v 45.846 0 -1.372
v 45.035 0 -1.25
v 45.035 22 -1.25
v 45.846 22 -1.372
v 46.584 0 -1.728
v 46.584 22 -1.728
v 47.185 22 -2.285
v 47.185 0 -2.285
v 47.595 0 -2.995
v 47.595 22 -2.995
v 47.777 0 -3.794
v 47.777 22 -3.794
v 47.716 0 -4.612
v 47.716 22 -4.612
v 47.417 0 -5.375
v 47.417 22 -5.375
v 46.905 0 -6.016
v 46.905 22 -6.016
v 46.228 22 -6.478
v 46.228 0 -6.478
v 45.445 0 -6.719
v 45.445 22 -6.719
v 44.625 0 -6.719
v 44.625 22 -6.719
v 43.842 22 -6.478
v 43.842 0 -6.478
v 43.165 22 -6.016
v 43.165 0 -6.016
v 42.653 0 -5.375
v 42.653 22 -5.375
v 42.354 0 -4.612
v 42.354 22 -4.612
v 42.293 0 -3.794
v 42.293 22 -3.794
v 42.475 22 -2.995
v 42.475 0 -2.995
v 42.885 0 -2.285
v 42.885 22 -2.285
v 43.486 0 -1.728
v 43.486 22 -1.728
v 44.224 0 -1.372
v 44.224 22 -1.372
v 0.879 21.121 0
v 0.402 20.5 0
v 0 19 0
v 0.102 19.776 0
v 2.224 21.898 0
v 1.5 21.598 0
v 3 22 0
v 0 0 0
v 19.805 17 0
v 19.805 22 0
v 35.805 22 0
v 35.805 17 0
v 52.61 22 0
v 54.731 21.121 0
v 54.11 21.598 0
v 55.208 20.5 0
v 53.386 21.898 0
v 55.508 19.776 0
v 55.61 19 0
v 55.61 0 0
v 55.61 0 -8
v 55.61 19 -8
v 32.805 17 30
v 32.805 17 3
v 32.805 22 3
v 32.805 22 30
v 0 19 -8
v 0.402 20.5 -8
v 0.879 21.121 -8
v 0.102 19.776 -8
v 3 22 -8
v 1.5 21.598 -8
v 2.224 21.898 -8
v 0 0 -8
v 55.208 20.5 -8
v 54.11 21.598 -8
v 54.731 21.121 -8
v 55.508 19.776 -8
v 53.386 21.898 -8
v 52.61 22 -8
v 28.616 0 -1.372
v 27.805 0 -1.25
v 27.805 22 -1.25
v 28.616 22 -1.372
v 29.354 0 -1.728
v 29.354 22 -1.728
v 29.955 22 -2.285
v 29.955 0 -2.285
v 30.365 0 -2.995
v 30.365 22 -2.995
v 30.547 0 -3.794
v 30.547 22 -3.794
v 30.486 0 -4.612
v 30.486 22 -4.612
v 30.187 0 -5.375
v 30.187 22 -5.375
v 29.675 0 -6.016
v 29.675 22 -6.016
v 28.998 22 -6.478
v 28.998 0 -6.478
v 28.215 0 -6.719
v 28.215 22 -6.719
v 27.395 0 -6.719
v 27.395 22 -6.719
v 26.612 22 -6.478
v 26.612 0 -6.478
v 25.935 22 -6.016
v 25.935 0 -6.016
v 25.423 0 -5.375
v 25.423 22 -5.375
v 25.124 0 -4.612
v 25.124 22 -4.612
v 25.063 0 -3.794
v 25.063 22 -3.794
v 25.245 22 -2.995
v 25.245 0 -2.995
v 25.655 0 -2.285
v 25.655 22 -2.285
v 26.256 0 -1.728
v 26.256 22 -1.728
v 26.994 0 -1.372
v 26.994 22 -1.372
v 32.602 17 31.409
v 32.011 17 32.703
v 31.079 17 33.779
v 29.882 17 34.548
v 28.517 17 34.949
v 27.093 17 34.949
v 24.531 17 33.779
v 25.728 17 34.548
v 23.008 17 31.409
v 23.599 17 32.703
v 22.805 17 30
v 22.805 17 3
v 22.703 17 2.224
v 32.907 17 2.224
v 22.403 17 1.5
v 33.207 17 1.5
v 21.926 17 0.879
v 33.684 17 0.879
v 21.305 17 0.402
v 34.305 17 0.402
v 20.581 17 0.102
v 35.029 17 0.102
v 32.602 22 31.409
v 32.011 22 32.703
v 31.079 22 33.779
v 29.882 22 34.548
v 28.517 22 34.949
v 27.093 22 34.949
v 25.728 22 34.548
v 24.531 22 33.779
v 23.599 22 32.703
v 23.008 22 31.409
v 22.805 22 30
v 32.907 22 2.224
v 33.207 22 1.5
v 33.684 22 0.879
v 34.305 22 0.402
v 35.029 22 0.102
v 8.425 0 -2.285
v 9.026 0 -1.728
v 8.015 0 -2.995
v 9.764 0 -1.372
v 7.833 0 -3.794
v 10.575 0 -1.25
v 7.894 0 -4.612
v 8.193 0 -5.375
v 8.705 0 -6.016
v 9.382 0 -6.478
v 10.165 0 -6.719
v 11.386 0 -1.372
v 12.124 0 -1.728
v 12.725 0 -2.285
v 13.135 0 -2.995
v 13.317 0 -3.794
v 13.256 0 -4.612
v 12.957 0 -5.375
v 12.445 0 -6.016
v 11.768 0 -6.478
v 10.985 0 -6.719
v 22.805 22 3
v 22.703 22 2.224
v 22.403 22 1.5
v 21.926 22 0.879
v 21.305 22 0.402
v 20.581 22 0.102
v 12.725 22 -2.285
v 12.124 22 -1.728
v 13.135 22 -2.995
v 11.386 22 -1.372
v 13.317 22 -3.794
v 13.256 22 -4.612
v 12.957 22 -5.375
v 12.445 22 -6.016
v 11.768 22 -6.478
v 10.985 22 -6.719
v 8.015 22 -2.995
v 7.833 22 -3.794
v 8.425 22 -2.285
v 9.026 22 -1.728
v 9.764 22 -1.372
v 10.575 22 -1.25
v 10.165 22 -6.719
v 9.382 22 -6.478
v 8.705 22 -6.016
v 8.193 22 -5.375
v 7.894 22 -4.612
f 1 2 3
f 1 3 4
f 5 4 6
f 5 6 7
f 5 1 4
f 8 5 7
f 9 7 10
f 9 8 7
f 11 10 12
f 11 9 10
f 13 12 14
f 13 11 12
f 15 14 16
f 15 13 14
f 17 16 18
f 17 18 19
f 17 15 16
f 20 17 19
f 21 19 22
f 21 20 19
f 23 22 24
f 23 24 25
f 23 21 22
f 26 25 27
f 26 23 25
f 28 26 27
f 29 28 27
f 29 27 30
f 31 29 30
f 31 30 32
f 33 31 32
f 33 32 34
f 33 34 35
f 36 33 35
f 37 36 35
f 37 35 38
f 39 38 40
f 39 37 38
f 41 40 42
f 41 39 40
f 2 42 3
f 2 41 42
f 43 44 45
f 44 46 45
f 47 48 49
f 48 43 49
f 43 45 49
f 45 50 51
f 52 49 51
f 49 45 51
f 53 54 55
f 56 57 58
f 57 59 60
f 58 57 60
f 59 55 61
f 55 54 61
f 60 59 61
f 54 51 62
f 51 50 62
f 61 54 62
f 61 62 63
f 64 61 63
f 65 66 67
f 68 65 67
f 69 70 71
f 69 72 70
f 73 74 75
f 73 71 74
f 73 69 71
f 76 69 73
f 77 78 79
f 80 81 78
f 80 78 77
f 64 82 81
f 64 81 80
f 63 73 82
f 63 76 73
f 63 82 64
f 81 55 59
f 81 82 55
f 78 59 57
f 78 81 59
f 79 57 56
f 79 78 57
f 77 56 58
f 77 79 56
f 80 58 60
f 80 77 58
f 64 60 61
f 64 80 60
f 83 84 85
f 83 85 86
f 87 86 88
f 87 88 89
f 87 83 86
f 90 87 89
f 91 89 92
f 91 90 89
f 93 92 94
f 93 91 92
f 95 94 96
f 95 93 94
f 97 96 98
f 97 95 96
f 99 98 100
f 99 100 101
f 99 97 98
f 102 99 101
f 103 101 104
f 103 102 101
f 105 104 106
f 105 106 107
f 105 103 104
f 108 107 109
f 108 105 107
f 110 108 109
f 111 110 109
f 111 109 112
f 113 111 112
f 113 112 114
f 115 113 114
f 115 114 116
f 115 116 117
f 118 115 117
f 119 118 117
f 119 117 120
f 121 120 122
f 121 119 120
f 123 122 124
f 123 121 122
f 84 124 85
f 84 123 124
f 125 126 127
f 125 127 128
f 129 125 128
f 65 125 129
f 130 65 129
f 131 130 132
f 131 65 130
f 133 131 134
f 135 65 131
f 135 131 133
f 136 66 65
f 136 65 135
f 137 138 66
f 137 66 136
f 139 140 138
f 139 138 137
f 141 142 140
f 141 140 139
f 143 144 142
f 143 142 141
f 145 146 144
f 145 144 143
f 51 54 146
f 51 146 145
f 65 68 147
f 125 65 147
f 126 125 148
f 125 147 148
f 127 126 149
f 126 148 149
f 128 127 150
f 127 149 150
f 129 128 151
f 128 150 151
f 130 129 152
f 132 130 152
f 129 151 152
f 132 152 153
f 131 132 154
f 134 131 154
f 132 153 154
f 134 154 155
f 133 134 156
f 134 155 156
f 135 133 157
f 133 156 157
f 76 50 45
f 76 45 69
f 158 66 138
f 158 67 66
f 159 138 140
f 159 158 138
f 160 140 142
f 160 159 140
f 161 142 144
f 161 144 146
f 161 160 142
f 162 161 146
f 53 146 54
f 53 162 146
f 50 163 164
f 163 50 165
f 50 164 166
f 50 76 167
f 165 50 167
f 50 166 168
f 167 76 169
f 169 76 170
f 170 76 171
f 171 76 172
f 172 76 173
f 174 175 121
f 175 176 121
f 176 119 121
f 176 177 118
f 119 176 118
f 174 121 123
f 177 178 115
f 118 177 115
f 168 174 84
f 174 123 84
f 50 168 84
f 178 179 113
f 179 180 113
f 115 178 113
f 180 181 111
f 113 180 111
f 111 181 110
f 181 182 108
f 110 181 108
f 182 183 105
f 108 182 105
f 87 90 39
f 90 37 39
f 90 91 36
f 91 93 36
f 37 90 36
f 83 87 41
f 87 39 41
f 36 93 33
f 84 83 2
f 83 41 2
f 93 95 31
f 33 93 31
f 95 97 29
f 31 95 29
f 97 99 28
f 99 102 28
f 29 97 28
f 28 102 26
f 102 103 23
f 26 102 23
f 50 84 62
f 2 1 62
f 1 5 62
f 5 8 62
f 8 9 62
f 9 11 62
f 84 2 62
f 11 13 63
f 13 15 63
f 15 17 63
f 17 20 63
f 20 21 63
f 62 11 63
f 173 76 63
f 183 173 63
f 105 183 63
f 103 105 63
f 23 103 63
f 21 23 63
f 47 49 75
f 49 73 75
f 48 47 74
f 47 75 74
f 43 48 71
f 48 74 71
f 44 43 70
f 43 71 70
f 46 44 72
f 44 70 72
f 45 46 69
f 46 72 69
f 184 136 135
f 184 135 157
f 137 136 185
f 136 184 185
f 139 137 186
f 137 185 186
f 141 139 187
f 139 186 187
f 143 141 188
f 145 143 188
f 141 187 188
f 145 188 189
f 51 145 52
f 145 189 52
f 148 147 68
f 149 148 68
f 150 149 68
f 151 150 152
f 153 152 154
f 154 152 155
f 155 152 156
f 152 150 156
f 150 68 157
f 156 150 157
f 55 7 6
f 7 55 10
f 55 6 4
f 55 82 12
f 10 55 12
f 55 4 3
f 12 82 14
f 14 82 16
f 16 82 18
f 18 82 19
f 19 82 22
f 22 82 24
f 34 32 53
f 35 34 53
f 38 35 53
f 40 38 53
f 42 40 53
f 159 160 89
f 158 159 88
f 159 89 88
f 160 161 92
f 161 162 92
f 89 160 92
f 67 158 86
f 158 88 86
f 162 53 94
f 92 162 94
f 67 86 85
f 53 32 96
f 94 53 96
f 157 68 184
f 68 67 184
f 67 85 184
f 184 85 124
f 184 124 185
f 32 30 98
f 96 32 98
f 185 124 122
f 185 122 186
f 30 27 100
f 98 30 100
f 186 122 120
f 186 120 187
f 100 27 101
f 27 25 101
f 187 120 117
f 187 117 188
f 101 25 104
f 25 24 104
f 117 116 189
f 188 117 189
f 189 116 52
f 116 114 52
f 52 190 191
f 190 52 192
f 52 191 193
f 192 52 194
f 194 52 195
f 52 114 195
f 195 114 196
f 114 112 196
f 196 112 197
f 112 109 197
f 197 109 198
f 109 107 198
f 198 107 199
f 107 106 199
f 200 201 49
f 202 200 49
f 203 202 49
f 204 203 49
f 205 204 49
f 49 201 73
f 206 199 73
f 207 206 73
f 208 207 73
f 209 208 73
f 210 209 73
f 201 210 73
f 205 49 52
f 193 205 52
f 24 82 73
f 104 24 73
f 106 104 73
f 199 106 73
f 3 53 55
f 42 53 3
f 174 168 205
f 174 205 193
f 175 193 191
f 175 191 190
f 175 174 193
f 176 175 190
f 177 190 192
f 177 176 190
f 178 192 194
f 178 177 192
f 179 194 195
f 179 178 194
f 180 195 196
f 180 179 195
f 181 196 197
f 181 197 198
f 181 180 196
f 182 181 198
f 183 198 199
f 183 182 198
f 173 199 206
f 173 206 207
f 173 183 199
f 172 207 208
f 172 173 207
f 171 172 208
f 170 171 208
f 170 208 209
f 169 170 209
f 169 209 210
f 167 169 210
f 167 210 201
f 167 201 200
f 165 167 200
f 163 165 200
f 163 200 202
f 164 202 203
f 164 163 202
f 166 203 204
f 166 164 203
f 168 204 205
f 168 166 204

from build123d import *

# Parameters (mm, degrees)
SKETCH1_W           = 55.61
SKETCH1_H           = 8
SKETCH1_R           = 2.75
BOSS_EXTRUDE1_DEPTH = 22
SKETCH2_W           = 5
SKETCH2_H           = 5
BOSS_EXTRUDE2_DEPTH = 30
BOSS_EXTRUDE3_DEPTH = 5
FILLET1_R           = 3


with BuildPart() as part:
    # Sketch1 → Boss-Extrude1 (new body)
    with BuildSketch(Plane(origin=(0, 0, 0), x_dir=(1, 0, 0), z_dir=(0, 1, 0))):
        with Locations((27.805, 4)):
            Rectangle(SKETCH1_W, SKETCH1_H)
        with Locations(Location((27.805, 4, 0), (0, 0, 270))):
            Circle(SKETCH1_R, mode=Mode.SUBTRACT)
        with Locations(Location((10.575, 4, 0), (0, 0, 270))):
            Circle(SKETCH1_R, mode=Mode.SUBTRACT)
        with Locations(Location((45.035, 4, 0), (0, 0, 270))):
            Circle(SKETCH1_R, mode=Mode.SUBTRACT)
    extrude(amount=BOSS_EXTRUDE1_DEPTH)

    # Sketch2 → Boss-Extrude2 (add)
    with BuildSketch(Plane.XY):
        with Locations((25.305, 19.5)):
            Rectangle(SKETCH2_W, SKETCH2_H)
        with Locations((30.305, 19.5)):
            Rectangle(SKETCH2_W, SKETCH2_H)
    extrude(amount=BOSS_EXTRUDE2_DEPTH)

    # Sketch3 → Boss-Extrude3 (add)
    with BuildSketch(Plane(origin=(0, 22, 0), x_dir=(1, 0, 0), z_dir=(0, 1, 0))):
        with BuildLine():
            Line((22.805, -30), (32.805, -30))
            ThreePointArc((32.805, -30), (27.805, -35), (22.805, -30))
        make_face()
    extrude(amount=-BOSS_EXTRUDE3_DEPTH)

    # Fillet1
    fillet1_edges = [part.edges().sort_by_distance(p)[0] for p in [
        (55.61, 22, -4),
        (22.805, 19.5, 0),
        (32.805, 19.5, 0),
        (0, 22, -4),
    ]]
    fillet(fillet1_edges, radius=FILLET1_R)


solid = part.part
